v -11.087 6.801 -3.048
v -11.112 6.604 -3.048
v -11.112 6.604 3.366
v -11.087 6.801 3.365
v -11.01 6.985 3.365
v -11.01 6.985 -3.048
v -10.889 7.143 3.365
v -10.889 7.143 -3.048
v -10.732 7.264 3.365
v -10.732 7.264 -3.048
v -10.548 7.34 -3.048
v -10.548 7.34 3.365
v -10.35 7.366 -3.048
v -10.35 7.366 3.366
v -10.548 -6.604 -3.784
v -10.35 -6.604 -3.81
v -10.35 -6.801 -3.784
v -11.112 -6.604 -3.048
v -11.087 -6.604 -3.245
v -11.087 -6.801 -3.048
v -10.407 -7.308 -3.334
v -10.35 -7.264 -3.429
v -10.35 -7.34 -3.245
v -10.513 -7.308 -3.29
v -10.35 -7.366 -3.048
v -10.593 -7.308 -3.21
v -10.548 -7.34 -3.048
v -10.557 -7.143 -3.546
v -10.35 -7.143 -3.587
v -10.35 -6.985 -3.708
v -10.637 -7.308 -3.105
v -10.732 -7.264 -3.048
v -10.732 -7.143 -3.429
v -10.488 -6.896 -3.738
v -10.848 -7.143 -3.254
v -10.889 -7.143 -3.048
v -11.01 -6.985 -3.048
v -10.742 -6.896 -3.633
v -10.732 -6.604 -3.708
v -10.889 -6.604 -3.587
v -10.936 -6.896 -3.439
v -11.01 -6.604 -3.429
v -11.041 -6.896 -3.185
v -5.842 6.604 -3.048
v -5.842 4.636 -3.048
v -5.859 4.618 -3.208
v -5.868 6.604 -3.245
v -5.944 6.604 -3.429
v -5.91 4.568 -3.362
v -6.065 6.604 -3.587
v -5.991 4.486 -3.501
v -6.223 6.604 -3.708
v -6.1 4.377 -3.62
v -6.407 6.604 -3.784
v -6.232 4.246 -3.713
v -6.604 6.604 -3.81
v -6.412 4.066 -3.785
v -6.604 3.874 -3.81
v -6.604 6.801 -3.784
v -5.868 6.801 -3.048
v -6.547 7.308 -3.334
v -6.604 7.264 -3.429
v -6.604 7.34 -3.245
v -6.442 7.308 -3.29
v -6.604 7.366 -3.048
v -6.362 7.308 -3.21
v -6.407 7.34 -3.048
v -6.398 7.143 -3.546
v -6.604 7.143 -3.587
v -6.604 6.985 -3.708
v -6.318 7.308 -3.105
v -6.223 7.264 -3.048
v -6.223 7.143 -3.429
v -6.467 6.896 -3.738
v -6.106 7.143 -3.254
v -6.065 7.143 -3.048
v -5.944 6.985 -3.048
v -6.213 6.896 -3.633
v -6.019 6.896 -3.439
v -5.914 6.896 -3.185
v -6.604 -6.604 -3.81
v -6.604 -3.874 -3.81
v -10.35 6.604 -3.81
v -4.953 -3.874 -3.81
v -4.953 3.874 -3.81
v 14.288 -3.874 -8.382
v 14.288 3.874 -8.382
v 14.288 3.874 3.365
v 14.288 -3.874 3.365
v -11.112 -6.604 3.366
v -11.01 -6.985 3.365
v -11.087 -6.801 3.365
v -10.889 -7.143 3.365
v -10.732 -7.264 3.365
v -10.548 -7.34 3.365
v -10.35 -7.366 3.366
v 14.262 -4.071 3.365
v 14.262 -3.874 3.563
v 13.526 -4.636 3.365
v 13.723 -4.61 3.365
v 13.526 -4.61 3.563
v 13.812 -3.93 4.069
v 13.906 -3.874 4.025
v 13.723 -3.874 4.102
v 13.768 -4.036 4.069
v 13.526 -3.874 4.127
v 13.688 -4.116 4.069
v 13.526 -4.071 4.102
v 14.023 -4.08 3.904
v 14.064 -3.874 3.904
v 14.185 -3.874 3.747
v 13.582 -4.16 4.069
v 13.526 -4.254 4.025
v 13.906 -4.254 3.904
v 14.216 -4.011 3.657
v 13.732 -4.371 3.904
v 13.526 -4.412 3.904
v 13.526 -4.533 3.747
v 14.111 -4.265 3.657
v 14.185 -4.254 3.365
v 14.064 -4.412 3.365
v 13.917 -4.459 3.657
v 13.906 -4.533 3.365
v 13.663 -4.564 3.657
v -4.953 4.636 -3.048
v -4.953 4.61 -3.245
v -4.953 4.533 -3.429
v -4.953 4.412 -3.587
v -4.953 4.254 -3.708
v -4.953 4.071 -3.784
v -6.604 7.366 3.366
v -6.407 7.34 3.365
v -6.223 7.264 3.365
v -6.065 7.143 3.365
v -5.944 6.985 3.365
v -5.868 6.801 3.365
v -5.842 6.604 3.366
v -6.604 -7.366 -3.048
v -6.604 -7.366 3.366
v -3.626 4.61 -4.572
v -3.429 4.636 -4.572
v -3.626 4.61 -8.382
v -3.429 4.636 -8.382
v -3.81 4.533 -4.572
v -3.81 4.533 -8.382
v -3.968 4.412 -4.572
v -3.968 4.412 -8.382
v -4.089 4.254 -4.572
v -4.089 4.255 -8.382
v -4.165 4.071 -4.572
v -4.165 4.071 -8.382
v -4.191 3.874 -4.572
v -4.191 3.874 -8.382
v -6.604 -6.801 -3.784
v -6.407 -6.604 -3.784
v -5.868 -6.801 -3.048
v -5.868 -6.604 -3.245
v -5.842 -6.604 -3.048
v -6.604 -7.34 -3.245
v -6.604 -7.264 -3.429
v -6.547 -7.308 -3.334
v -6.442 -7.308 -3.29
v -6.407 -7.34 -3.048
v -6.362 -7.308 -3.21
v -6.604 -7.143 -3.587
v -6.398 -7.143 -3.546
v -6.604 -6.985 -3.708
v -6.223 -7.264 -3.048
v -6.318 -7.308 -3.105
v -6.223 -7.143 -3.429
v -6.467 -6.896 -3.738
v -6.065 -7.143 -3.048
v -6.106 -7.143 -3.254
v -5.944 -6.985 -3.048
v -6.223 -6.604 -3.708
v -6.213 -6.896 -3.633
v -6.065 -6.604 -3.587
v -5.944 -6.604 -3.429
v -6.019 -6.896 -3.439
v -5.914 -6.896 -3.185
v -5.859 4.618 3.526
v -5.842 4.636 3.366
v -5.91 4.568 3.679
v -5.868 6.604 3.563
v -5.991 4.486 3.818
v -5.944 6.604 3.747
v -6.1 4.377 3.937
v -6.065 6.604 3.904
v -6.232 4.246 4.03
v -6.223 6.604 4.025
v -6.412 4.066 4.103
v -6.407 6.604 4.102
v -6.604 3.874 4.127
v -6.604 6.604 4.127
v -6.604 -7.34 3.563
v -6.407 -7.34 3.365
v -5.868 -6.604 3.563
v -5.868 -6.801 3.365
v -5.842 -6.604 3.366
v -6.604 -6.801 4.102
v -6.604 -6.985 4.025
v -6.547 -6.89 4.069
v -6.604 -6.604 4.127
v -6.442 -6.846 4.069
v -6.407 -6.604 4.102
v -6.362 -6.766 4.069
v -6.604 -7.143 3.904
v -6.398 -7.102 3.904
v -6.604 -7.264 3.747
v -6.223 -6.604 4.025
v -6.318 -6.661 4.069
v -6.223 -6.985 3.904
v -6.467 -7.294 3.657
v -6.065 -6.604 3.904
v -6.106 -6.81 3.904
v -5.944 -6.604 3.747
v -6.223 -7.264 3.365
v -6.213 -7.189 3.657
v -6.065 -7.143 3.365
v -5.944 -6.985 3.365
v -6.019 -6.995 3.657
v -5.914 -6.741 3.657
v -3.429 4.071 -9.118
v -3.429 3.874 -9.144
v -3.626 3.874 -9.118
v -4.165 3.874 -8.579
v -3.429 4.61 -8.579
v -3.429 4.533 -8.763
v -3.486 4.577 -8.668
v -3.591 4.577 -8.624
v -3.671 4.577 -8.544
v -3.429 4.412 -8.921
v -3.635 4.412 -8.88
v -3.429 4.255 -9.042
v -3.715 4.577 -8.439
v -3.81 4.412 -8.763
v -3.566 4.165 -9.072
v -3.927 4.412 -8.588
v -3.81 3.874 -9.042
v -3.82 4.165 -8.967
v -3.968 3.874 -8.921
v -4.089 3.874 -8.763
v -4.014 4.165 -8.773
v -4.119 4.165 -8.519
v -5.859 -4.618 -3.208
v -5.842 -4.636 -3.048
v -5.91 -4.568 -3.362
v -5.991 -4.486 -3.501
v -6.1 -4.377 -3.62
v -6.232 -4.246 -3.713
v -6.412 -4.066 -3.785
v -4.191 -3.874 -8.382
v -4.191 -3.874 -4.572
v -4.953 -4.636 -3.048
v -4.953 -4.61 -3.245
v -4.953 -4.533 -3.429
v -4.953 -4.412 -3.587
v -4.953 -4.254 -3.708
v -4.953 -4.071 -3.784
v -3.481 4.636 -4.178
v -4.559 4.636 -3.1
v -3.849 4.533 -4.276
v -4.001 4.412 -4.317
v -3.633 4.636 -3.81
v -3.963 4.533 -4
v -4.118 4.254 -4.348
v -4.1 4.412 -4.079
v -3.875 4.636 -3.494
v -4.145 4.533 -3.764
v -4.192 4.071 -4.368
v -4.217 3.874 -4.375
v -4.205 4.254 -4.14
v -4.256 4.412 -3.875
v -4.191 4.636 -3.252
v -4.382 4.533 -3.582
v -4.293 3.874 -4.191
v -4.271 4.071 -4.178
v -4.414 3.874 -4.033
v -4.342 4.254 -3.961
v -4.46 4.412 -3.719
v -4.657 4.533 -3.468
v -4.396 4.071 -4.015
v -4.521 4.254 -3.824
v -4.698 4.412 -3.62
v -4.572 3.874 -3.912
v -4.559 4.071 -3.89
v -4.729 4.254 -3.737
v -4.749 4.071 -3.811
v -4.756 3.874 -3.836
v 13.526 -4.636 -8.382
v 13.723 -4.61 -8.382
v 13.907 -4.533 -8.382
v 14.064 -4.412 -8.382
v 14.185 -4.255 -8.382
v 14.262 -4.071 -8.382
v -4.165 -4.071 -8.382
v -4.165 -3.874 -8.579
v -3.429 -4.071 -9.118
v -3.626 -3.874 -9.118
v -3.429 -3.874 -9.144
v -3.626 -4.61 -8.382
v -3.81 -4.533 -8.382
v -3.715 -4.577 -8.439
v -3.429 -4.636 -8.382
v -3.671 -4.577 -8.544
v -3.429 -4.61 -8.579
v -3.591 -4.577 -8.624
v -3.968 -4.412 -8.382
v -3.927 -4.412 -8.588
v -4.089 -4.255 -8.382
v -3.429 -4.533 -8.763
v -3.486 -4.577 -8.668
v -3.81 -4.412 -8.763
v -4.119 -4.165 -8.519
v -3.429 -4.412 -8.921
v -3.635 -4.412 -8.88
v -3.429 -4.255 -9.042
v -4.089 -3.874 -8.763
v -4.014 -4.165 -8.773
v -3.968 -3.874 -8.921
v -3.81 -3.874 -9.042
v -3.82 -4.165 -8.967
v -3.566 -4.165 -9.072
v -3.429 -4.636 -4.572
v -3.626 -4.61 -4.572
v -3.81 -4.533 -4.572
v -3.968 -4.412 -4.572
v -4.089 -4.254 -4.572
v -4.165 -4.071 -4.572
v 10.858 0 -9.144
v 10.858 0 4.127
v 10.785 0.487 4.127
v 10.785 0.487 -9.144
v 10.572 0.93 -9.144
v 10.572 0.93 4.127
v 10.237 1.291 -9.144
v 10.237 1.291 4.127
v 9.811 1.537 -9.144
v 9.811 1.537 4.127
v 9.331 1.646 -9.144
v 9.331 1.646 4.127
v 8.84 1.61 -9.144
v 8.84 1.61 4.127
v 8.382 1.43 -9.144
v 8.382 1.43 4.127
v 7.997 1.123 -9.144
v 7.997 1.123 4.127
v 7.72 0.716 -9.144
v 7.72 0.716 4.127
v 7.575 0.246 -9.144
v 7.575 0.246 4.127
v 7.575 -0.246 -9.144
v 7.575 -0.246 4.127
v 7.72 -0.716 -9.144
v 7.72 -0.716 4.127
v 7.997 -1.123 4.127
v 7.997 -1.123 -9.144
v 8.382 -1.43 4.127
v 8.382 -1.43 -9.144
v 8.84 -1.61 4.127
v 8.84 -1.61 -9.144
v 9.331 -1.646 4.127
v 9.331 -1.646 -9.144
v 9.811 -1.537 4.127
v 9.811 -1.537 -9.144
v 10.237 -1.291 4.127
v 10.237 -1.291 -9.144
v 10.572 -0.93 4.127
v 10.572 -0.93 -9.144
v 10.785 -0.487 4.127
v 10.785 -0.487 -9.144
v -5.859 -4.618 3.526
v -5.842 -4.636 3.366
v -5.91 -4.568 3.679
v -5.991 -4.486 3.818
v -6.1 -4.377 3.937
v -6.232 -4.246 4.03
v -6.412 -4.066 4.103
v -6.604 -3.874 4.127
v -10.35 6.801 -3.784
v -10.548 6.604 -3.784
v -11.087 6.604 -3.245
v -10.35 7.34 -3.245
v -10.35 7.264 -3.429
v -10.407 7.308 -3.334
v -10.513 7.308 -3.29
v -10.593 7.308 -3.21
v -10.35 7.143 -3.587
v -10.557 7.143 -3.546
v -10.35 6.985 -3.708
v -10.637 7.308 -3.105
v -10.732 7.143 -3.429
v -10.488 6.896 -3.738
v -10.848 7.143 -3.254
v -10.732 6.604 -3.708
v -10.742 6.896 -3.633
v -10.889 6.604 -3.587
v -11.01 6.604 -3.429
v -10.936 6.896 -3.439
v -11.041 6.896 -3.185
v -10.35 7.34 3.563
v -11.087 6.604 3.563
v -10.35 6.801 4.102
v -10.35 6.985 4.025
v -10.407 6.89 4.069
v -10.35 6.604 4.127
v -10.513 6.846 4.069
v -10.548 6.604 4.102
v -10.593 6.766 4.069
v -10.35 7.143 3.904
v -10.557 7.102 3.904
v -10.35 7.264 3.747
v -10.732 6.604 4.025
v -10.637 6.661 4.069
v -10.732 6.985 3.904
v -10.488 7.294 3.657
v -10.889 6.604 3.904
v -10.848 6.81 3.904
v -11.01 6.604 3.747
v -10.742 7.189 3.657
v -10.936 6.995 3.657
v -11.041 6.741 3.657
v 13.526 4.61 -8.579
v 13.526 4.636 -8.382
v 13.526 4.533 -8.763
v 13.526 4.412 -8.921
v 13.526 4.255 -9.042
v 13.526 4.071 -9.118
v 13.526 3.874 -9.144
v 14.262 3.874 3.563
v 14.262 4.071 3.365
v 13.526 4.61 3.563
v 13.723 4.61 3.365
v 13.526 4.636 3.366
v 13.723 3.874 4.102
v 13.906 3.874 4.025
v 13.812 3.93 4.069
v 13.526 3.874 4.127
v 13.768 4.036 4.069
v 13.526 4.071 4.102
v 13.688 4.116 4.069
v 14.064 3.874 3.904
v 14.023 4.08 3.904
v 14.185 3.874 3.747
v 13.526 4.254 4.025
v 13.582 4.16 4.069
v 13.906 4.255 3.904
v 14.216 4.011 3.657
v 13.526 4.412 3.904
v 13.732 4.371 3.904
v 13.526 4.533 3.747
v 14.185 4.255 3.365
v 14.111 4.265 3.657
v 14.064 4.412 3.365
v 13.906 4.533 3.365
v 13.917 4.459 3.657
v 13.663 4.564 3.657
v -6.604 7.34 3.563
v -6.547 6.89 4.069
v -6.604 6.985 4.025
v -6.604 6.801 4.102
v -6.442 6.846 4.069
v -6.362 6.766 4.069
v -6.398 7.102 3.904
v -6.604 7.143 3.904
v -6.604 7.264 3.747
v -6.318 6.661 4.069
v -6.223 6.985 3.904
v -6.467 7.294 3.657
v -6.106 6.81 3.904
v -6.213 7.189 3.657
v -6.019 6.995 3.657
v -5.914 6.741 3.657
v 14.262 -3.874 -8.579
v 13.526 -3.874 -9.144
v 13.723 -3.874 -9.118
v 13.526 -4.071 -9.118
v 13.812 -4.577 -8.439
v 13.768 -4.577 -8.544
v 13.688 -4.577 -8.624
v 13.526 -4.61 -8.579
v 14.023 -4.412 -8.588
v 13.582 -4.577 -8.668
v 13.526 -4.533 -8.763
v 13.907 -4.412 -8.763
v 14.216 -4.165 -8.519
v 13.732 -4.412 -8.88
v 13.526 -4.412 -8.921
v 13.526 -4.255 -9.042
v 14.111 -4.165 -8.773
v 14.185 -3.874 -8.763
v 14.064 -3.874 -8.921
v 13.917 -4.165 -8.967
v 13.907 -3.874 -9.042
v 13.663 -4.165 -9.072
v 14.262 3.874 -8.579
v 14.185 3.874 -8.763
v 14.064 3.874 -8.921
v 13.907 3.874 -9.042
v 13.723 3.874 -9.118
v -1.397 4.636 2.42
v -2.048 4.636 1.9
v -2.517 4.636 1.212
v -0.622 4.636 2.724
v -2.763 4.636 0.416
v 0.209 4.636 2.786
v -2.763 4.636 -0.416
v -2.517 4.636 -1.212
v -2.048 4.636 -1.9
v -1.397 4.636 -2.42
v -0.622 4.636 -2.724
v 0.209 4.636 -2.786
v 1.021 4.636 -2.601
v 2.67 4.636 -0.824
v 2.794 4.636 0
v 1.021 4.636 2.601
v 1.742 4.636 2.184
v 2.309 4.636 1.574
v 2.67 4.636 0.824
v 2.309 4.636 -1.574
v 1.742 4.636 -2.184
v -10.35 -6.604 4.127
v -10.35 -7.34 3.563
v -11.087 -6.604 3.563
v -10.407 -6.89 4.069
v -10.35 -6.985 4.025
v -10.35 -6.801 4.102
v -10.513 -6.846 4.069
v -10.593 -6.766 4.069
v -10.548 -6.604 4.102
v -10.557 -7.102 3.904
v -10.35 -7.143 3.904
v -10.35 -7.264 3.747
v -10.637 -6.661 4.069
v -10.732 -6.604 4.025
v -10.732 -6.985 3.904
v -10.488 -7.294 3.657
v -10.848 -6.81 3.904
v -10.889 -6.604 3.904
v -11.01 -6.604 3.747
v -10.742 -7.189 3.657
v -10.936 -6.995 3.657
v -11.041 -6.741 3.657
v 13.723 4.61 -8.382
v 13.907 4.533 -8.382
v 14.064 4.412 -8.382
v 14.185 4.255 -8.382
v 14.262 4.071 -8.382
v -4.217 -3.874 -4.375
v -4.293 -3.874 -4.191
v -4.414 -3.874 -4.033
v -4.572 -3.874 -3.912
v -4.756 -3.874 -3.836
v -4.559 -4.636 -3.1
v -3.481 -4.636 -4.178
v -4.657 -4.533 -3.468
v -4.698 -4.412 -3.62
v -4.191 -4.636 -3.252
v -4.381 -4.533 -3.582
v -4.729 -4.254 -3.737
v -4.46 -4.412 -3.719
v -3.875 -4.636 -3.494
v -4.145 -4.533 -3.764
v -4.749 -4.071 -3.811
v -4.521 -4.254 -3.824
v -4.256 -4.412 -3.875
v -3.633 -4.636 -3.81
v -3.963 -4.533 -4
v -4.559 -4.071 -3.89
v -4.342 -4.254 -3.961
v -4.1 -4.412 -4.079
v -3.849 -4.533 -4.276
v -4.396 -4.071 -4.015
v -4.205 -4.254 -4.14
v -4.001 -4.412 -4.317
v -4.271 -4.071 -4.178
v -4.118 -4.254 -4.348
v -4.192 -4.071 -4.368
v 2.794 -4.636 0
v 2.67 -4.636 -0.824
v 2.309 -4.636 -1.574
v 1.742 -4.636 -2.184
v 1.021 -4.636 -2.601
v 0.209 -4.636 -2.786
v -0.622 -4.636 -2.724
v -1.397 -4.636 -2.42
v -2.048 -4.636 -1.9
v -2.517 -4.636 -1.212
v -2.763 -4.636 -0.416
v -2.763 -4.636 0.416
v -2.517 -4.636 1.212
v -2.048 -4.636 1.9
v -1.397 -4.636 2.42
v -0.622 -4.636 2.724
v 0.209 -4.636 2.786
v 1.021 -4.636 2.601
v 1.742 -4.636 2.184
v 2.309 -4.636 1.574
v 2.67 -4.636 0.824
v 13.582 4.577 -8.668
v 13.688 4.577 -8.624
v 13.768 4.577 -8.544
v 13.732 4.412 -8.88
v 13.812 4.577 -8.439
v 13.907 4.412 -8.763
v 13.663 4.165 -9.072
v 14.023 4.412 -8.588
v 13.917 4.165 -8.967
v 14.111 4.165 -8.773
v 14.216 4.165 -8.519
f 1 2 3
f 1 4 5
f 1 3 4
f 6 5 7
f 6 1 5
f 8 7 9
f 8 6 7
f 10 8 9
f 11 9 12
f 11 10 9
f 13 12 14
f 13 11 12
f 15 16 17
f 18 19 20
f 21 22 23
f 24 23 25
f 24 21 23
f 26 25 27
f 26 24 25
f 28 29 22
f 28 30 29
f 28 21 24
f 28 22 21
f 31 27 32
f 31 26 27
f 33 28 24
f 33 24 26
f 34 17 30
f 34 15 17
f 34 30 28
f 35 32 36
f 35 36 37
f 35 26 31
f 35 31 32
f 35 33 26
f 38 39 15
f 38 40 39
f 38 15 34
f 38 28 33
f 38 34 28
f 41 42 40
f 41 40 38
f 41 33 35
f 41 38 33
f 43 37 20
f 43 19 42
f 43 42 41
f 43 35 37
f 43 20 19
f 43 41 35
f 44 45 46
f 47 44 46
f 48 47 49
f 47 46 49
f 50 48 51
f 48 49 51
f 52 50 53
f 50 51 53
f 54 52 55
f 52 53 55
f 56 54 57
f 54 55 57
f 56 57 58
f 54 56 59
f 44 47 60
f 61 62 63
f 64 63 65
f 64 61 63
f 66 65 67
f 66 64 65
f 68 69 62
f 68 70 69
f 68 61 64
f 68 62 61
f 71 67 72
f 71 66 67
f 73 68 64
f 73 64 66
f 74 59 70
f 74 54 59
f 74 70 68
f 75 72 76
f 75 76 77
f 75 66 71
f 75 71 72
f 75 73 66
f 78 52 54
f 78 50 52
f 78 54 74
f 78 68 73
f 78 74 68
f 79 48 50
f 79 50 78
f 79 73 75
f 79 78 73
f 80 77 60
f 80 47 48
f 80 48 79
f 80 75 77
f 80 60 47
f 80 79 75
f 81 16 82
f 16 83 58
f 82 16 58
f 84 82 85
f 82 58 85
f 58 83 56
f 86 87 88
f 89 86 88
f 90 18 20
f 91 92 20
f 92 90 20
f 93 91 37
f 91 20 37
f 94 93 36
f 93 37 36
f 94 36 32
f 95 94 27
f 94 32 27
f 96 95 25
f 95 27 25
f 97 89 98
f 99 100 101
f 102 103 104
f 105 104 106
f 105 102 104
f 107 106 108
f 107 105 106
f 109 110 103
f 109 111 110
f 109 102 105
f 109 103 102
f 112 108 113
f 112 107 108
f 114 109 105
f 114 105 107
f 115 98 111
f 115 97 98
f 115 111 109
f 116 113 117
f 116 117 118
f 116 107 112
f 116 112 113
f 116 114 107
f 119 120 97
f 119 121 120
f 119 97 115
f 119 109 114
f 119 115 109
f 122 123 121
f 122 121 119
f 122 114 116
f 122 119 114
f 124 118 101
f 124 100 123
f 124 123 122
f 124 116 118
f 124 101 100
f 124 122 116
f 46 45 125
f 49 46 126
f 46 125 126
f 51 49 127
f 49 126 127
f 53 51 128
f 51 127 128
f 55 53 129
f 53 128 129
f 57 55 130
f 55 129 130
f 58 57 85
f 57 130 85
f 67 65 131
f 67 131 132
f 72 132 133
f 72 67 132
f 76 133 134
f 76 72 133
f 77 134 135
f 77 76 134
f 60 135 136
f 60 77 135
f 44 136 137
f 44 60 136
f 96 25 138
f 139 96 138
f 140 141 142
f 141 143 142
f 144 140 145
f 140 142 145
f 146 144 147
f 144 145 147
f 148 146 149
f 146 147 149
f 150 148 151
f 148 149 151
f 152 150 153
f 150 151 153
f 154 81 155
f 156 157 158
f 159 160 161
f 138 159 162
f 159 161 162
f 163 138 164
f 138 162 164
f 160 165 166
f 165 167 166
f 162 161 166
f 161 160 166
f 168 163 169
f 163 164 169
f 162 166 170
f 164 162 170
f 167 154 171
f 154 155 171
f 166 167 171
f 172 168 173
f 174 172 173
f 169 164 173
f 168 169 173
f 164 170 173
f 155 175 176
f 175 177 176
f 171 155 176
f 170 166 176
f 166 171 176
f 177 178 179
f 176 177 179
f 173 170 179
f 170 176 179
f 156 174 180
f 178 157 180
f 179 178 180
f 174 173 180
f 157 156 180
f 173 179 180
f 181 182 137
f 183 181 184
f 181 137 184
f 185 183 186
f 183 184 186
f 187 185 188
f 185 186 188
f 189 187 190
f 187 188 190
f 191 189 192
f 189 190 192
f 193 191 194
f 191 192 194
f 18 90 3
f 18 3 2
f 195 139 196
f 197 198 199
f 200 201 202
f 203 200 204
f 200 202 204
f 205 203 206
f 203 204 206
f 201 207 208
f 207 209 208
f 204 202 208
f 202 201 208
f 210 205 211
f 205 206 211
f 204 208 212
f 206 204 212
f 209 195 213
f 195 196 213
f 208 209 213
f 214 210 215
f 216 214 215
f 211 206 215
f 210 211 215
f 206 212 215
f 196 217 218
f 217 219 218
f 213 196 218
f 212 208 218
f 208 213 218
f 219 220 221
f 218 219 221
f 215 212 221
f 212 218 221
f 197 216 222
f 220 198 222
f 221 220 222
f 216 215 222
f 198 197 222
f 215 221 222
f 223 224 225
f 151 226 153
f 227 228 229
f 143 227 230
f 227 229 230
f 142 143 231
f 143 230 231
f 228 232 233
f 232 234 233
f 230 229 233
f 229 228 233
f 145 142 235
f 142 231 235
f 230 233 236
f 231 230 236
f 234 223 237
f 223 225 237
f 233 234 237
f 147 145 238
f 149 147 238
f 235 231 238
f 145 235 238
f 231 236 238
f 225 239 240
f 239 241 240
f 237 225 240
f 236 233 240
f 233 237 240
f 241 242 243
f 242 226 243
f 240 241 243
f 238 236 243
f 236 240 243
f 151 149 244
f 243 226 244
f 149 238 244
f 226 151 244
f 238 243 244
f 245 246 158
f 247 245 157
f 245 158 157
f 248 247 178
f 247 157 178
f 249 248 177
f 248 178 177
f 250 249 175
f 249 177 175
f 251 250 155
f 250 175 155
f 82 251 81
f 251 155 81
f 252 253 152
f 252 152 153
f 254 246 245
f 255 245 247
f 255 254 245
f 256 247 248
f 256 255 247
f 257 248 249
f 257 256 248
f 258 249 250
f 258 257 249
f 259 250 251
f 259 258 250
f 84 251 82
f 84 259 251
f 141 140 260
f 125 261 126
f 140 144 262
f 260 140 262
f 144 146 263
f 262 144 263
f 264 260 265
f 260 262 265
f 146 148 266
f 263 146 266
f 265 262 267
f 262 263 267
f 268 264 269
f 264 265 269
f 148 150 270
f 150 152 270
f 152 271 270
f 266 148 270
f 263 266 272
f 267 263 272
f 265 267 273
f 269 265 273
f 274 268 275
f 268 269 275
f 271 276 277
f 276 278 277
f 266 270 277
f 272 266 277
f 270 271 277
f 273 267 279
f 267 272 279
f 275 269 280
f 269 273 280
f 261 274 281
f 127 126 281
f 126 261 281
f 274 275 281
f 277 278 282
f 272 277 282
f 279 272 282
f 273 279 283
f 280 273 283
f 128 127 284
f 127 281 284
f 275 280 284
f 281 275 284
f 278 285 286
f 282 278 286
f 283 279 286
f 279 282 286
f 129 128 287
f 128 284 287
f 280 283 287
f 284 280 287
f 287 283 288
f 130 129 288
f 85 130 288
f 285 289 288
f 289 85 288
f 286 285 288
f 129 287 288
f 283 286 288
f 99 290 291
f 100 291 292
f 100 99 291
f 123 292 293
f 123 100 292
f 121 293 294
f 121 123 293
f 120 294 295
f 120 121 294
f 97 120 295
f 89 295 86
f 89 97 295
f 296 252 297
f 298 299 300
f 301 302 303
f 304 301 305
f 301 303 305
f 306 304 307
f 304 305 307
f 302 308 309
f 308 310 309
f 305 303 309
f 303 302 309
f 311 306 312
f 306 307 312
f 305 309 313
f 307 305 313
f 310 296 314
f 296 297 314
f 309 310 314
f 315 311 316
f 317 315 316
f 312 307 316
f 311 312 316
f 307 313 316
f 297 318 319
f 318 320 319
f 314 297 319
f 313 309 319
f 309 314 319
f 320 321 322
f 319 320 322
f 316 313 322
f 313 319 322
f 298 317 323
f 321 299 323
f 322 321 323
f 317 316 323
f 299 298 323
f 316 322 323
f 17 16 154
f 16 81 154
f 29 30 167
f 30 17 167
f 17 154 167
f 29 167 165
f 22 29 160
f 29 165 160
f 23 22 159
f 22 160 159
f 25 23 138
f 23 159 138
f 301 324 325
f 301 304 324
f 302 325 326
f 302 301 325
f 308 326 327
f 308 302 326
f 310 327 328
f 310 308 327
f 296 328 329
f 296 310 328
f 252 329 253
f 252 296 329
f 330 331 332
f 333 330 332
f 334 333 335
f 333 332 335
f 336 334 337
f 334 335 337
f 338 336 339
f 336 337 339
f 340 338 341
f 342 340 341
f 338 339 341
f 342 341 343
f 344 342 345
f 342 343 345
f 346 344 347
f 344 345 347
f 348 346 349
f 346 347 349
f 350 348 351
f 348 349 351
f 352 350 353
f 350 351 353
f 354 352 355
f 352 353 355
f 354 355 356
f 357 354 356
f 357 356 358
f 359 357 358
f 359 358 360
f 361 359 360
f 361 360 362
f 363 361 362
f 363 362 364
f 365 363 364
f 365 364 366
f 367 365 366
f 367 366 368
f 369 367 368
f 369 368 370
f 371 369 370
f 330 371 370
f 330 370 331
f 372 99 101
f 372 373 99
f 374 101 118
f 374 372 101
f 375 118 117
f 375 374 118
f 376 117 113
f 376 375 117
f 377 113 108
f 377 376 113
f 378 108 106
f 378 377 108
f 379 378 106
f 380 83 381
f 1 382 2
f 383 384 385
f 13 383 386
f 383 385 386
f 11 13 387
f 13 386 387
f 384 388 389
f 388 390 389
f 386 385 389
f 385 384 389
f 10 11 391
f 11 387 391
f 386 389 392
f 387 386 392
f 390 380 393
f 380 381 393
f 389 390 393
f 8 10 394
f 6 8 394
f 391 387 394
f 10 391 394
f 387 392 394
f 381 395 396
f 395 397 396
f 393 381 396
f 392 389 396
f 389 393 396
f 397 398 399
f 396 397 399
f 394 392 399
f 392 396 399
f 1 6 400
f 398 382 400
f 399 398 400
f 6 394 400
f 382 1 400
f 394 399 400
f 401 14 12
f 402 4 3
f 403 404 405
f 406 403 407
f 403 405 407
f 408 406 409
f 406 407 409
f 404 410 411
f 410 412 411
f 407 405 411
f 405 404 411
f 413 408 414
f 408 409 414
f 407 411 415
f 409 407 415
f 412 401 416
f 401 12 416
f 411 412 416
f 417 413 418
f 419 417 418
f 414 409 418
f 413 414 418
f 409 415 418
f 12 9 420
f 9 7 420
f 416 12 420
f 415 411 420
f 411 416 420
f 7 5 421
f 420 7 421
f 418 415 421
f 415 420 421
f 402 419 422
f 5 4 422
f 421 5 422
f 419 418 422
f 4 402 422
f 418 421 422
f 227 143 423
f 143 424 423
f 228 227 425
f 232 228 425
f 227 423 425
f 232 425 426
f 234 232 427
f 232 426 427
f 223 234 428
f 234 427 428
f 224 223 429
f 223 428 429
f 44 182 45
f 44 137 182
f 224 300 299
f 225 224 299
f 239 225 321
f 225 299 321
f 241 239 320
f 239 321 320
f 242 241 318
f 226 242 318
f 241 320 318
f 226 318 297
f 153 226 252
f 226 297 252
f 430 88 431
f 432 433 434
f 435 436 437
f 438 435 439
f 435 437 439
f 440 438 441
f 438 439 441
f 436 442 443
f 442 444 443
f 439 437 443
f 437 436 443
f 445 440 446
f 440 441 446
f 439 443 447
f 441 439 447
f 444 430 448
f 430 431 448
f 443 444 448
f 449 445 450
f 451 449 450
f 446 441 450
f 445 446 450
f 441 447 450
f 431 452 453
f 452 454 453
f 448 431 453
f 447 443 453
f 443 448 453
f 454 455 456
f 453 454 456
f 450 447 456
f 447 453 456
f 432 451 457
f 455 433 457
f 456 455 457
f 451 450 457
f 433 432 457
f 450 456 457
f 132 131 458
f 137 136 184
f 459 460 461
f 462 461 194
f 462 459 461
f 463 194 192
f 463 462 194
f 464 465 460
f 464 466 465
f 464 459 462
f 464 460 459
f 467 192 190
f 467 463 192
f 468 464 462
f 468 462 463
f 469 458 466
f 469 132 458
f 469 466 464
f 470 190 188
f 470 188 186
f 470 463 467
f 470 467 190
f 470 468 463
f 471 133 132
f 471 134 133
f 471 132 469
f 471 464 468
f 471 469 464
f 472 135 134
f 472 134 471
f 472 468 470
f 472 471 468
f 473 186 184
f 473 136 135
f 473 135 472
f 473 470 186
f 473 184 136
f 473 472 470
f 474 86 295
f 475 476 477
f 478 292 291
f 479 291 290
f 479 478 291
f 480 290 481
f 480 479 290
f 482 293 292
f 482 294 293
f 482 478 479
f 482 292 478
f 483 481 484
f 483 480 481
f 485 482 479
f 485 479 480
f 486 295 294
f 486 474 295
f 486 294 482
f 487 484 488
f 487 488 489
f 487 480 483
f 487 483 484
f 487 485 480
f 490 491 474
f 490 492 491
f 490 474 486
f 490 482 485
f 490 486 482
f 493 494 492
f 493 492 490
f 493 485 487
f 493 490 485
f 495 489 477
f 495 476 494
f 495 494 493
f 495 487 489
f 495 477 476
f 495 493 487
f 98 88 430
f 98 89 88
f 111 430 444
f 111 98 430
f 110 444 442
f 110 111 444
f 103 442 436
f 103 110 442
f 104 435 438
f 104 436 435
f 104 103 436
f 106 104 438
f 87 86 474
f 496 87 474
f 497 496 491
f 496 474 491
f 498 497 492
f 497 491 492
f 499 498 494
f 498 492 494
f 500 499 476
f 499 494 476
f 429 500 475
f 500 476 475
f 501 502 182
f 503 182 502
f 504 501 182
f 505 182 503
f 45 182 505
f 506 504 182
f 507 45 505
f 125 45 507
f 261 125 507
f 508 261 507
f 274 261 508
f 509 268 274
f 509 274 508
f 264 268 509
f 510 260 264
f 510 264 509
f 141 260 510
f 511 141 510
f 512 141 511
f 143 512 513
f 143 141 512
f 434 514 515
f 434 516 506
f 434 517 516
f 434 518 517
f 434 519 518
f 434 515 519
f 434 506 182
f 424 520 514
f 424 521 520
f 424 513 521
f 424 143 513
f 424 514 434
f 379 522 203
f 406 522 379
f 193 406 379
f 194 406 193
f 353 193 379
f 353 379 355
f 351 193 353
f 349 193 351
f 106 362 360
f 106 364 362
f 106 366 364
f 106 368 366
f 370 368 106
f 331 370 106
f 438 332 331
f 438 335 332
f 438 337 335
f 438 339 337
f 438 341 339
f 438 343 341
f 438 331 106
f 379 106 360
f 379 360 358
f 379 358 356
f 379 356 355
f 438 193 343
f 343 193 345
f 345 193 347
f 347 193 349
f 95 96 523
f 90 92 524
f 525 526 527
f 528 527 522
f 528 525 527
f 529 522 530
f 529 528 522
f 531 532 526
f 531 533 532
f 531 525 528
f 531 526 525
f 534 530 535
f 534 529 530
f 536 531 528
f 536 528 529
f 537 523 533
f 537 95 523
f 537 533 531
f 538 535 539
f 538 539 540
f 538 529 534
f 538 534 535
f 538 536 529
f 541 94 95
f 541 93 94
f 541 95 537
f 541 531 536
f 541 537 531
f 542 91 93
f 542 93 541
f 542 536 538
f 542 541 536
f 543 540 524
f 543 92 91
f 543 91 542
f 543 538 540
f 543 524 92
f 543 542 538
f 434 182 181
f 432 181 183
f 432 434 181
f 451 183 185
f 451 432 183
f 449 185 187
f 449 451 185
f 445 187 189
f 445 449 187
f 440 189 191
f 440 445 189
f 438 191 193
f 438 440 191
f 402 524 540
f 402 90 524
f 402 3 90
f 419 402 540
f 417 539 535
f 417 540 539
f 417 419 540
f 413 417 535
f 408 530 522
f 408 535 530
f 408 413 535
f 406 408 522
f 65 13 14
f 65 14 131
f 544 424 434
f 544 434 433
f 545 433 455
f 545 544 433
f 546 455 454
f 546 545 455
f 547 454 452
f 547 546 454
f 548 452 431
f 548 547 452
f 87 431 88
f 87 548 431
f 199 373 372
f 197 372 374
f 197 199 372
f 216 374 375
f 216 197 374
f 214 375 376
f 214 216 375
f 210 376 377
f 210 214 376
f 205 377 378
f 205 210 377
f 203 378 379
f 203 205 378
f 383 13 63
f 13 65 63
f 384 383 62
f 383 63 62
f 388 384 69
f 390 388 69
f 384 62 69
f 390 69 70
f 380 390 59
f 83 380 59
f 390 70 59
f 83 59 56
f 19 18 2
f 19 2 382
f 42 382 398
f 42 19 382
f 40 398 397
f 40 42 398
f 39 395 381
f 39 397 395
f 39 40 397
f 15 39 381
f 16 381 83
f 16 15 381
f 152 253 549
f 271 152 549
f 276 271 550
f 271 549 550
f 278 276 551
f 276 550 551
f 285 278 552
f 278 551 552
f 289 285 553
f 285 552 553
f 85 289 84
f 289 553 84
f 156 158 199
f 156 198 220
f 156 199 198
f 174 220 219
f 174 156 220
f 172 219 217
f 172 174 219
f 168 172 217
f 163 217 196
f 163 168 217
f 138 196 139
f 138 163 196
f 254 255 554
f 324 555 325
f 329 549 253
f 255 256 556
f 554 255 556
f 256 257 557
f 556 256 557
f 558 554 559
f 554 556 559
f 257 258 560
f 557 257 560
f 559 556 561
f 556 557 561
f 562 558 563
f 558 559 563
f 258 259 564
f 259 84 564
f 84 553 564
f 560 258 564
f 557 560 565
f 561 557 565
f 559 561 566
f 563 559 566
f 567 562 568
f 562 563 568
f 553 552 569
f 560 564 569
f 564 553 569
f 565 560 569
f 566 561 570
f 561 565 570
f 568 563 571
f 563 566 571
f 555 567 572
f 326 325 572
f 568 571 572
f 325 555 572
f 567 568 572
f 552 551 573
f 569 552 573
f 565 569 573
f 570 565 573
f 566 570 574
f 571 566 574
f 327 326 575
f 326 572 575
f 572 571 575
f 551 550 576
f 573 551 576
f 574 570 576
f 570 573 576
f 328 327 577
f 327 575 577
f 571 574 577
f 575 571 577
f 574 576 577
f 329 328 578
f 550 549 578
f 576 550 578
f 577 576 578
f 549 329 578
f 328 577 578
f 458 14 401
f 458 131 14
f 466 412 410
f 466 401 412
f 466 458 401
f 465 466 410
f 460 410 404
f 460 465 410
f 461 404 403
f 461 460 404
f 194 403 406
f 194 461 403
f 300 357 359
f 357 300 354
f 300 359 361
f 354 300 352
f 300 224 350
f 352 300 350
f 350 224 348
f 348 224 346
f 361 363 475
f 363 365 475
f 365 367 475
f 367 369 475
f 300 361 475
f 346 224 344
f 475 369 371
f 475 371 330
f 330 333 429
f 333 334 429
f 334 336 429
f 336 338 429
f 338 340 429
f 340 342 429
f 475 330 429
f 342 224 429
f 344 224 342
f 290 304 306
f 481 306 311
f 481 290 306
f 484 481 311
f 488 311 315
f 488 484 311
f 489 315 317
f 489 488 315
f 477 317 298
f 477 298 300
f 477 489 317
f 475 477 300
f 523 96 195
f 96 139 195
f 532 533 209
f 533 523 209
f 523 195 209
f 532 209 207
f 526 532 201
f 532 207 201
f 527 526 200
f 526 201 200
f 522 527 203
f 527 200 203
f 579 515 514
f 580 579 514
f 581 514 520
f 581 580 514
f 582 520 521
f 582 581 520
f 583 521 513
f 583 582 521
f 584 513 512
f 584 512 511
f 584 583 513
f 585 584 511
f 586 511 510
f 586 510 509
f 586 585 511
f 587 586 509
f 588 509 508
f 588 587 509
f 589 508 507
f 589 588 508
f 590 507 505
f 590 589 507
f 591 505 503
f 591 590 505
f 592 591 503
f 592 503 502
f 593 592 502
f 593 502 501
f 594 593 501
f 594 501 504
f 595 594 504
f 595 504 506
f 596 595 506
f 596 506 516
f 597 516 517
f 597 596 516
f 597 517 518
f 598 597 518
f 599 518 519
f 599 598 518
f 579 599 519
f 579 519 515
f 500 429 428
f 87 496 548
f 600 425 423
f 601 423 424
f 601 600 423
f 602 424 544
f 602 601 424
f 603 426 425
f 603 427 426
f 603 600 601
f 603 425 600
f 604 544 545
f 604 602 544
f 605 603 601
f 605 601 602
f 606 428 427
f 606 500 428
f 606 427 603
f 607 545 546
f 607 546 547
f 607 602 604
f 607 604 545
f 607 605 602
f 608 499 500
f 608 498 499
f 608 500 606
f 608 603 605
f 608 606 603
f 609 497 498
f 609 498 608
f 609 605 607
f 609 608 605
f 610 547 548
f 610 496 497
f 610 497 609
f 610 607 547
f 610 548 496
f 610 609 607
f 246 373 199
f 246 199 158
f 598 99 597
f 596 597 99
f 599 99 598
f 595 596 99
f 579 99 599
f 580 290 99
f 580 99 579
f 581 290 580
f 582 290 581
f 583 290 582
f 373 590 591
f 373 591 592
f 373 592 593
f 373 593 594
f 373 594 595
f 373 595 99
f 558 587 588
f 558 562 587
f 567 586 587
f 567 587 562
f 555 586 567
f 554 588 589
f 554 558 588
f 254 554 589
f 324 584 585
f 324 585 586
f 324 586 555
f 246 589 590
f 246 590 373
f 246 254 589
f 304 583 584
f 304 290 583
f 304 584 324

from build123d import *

# Parameters (mm, degrees)
SKETCH1_R                      = 2.794
BOSS_EXTRUDE1_DEPTH            = 4.6355
SKETCH3_W                      = 5.2705
SKETCH3_H                      = 10.4775
BOSS_EXTRUDE3_DEPTH            = 7.366
SKETCH5_R                      = 1.651
CUT_EXTRUDE2_DEPTH             = 15.8115
CUT_EXTRUDE3_REACH             = 4.731
SKETCH6_W                      = 25.4
SKETCH6_H                      = 2.54
CUT_EXTRUDE3_DIRECTION_2_REACH = 14.002
FILLET1_R                      = 0.762


with BuildPart() as part:
    # Sketch1 → Boss-Extrude1 (new body, symmetric)
    with BuildSketch(Plane(origin=(0, 0, 0), x_dir=(1, 0, 0), z_dir=(0, 1, 0))):
        Polygon((-11.1125, 3.81), (-4.191, 3.81), (-4.191, 9.144), (14.2875, 9.144), (14.2875, -6.6675), (-11.1125, -6.6675), align=None)
        Circle(SKETCH1_R, mode=Mode.SUBTRACT)
    extrude(amount=BOSS_EXTRUDE1_DEPTH, both=True)

    # Sketch3 → Boss-Extrude3 (add, symmetric)
    with BuildSketch(Plane(origin=(0, 0, 0), x_dir=(1, 0, 0), z_dir=(0, 1, 0))):
        with Locations((-8.47725, -1.42875)):
            Rectangle(SKETCH3_W, SKETCH3_H)
    extrude(amount=BOSS_EXTRUDE3_DEPTH, both=True)

    # Sketch5 → Cut-Extrude2 (cut)
    with BuildSketch(Plane.XY.offset(6.6675)):
        with Locations((9.2075, 0)):
            Circle(SKETCH5_R)
    extrude(amount=-CUT_EXTRUDE2_DEPTH, mode=Mode.SUBTRACT)

    # Cut-Extrude3: up to this face of the body (flat: up to its plane)
    cut_extrude3_end = Plane(part.part.faces().sort_by_distance((-8.47725, 7.366, 1.42875))[0])
    # Sketch6 → Cut-Extrude3 (cut, up to the picked face)
    with BuildSketch(Plane(origin=(0, 4.6355, 0), x_dir=(1, 0, 0), z_dir=(0, 1, 0)), mode=Mode.PRIVATE) as cut_extrude3_sk1:
        with Locations((1.5875, -5.3975)):
            Rectangle(SKETCH6_W, SKETCH6_H)
    cut_extrude3_tool1 = split(extrude(cut_extrude3_sk1.sketch, amount=CUT_EXTRUDE3_REACH, mode=Mode.PRIVATE), bisect_by=cut_extrude3_end, keep=Keep.BOTH, mode=Mode.PRIVATE)
    add(cut_extrude3_tool1.solids().sort_by_distance((1.5875, 4.6355, 5.3975))[0], mode=Mode.SUBTRACT)

    # Cut-Extrude3 direction 2: up to this face of the body (flat: up to its plane)
    cut_extrude3_direction_2_end = Plane(part.part.faces().sort_by_distance((-8.47725, -7.366, 1.42875))[0])
    # Sketch6 → Cut-Extrude3 direction 2 (cut, up to the picked face)
    with BuildSketch(Plane(origin=(0, 4.6355, 0), x_dir=(1, 0, 0), z_dir=(0, 1, 0)), mode=Mode.PRIVATE) as cut_extrude3_direction_2_sk1:
        with Locations((1.5875, -5.3975)):
            Rectangle(SKETCH6_W, SKETCH6_H)
    cut_extrude3_direction_2_tool1 = split(extrude(cut_extrude3_direction_2_sk1.sketch, amount=-CUT_EXTRUDE3_DIRECTION_2_REACH, mode=Mode.PRIVATE), bisect_by=cut_extrude3_direction_2_end, keep=Keep.BOTH, mode=Mode.PRIVATE)
    add(cut_extrude3_direction_2_tool1.solids().sort_by_distance((1.5875, 4.6355, 5.3975))[0], mode=Mode.SUBTRACT)

    # Fillet1
    fillet1_edges = [part.edges().sort_by_distance(p)[0] for p in [
        (-11.1125, 0, -3.81),
        (-4.191, 0, -3.81),
        (-4.191, 0, -9.144),
        (14.2875, 0, -9.144),
        (5.04825, 4.6355, -9.144),
        (-4.191, 4.6355, -6.477),
        (-5.0165, 4.6355, -3.81),
        (-5.842, 6.00075, -3.81),
        (-5.842, -6.00075, -3.81),
        (-8.47725, -7.366, -3.81),
        (-11.1125, -7.366, 0.15875),
        (-8.47725, 7.366, -3.81),
        (-11.1125, 7.366, 0.15875),
        (-5.842, 7.366, 0.15875),
        (-5.842, -7.366, 0.15875),
        (14.2875, -4.6355, -2.50825),
        (14.2875, 4.6355, -2.50825),
        (-8.47725, -7.366, 4.1275),
        (-8.47725, 7.366, 4.1275),
        (-5.0165, -4.6355, -3.81),
        (-5.842, -6.00075, 4.1275),
        (14.2875, 0, 4.1275),
        (4.22275, -4.6355, 4.1275),
        (4.22275, 4.6355, 4.1275),
        (-5.842, 6.00075, 4.1275),
        (-11.1125, 0, 4.1275),
        (-4.191, -4.6355, -6.477),
        (5.04825, -4.6355, -9.144),
    ]]
    fillet(fillet1_edges, radius=FILLET1_R)


solid = part.part
